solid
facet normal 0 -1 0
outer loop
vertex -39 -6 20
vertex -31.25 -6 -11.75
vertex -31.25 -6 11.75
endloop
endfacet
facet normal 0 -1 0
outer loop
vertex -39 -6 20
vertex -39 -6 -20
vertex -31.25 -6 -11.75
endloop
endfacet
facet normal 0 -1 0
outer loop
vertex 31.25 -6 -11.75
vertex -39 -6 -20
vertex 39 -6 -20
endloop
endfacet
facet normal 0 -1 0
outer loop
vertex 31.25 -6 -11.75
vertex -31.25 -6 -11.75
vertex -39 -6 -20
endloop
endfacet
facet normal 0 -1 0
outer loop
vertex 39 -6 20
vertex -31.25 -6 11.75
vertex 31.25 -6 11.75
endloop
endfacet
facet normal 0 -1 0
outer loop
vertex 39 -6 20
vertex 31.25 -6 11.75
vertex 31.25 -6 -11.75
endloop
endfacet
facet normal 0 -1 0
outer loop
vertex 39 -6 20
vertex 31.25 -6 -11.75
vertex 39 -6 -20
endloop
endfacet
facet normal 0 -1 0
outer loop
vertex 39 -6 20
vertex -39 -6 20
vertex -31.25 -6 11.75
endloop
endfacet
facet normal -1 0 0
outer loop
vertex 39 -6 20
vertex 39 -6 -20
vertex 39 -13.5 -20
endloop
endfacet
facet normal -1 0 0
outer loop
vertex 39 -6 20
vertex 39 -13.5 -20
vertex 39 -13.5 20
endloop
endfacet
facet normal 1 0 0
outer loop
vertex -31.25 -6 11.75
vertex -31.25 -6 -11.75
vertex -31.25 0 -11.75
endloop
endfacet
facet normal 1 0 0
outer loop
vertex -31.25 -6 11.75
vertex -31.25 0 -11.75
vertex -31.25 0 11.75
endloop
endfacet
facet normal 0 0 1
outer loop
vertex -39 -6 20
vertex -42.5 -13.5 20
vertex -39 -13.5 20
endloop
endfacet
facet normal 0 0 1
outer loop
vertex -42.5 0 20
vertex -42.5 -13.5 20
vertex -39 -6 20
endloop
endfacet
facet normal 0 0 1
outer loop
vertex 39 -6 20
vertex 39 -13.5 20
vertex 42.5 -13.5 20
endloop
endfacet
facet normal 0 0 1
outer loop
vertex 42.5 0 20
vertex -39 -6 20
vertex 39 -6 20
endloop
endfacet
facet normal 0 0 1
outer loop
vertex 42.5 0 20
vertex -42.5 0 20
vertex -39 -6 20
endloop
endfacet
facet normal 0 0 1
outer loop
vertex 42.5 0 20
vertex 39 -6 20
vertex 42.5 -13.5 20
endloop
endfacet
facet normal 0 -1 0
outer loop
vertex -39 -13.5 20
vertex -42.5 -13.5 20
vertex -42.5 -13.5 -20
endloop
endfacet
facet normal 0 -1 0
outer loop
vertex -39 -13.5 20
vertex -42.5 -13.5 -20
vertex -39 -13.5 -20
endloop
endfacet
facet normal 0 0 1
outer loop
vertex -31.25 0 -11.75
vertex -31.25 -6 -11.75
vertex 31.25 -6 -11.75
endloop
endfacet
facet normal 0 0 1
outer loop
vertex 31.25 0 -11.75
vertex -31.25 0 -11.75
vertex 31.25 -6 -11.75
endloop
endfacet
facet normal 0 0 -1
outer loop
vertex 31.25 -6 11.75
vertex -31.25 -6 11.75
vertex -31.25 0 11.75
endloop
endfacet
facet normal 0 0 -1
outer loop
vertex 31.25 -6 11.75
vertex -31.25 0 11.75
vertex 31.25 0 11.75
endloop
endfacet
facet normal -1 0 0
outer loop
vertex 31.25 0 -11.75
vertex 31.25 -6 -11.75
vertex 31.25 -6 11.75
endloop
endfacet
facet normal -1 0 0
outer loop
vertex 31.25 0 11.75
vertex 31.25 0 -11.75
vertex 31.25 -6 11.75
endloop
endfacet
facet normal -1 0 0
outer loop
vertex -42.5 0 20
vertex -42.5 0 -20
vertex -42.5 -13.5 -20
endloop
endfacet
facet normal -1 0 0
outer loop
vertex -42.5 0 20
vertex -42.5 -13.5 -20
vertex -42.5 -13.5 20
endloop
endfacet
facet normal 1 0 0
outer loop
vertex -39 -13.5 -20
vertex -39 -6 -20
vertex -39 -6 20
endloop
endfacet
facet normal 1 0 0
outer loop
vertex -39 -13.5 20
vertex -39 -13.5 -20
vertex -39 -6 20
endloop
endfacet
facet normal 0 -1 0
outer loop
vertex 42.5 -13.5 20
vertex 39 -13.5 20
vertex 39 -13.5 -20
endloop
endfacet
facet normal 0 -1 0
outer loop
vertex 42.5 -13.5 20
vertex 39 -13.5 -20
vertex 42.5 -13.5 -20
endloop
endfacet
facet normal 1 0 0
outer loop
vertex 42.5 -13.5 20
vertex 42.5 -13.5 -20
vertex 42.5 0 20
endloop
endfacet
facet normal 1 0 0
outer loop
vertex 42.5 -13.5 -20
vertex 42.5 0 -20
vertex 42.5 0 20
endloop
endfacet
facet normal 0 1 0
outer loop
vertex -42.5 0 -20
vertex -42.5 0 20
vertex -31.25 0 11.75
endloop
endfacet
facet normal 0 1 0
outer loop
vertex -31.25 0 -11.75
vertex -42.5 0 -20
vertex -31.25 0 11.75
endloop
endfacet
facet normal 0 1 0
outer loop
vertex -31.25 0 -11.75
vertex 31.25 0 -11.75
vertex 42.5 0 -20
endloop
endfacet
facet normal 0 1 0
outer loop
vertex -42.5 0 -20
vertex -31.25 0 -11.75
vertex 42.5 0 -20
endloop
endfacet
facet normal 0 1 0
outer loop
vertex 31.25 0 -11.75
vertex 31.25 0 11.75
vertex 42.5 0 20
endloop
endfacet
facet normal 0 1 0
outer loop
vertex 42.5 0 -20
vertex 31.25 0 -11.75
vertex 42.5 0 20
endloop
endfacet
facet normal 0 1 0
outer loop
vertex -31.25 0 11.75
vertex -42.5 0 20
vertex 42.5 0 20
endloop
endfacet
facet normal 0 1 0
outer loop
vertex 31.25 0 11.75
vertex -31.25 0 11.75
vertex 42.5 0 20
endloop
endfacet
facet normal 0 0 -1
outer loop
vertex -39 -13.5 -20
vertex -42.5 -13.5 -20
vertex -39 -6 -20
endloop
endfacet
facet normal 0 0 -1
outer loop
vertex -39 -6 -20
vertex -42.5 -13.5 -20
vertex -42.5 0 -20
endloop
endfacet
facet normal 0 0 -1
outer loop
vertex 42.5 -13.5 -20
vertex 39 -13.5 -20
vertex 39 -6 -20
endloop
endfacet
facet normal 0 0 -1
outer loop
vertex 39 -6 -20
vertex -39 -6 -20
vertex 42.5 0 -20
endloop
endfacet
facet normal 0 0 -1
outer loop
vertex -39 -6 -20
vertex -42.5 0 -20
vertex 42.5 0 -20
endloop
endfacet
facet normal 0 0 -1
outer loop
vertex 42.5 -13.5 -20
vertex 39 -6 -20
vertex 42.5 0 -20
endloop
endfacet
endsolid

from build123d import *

# Parameters (mm, degrees)
F0_W     = 85
F0_H     = 40
F1_DEPTH = 6
F2_W     = 62.5
F2_H     = 23.5
F3_DEPTH = 25
F4_W     = 3.5
F4_H     = 40
F5_DEPTH = 7.5


with BuildPart() as f1:
    # F0 (on Front) → F1 (new body)
    with BuildSketch(Plane.XZ):
        Rectangle(F0_W, F0_H)
    extrude(amount=F1_DEPTH)

    # F2 (on face) → F3 (cut)
    with BuildSketch(Plane.XZ.offset(6)):
        Rectangle(F2_W, F2_H)
    extrude(amount=-F3_DEPTH, mode=Mode.SUBTRACT)

    # F4 (on face) → F5 (join)
    with BuildSketch(Plane.XZ.offset(6)):
        with Locations((40.75, 0)):
            Rectangle(F4_W, F4_H)
        with Locations((-40.75, 0)):
            Rectangle(F4_W, F4_H)
    extrude(amount=F5_DEPTH)


solid = f1.part
